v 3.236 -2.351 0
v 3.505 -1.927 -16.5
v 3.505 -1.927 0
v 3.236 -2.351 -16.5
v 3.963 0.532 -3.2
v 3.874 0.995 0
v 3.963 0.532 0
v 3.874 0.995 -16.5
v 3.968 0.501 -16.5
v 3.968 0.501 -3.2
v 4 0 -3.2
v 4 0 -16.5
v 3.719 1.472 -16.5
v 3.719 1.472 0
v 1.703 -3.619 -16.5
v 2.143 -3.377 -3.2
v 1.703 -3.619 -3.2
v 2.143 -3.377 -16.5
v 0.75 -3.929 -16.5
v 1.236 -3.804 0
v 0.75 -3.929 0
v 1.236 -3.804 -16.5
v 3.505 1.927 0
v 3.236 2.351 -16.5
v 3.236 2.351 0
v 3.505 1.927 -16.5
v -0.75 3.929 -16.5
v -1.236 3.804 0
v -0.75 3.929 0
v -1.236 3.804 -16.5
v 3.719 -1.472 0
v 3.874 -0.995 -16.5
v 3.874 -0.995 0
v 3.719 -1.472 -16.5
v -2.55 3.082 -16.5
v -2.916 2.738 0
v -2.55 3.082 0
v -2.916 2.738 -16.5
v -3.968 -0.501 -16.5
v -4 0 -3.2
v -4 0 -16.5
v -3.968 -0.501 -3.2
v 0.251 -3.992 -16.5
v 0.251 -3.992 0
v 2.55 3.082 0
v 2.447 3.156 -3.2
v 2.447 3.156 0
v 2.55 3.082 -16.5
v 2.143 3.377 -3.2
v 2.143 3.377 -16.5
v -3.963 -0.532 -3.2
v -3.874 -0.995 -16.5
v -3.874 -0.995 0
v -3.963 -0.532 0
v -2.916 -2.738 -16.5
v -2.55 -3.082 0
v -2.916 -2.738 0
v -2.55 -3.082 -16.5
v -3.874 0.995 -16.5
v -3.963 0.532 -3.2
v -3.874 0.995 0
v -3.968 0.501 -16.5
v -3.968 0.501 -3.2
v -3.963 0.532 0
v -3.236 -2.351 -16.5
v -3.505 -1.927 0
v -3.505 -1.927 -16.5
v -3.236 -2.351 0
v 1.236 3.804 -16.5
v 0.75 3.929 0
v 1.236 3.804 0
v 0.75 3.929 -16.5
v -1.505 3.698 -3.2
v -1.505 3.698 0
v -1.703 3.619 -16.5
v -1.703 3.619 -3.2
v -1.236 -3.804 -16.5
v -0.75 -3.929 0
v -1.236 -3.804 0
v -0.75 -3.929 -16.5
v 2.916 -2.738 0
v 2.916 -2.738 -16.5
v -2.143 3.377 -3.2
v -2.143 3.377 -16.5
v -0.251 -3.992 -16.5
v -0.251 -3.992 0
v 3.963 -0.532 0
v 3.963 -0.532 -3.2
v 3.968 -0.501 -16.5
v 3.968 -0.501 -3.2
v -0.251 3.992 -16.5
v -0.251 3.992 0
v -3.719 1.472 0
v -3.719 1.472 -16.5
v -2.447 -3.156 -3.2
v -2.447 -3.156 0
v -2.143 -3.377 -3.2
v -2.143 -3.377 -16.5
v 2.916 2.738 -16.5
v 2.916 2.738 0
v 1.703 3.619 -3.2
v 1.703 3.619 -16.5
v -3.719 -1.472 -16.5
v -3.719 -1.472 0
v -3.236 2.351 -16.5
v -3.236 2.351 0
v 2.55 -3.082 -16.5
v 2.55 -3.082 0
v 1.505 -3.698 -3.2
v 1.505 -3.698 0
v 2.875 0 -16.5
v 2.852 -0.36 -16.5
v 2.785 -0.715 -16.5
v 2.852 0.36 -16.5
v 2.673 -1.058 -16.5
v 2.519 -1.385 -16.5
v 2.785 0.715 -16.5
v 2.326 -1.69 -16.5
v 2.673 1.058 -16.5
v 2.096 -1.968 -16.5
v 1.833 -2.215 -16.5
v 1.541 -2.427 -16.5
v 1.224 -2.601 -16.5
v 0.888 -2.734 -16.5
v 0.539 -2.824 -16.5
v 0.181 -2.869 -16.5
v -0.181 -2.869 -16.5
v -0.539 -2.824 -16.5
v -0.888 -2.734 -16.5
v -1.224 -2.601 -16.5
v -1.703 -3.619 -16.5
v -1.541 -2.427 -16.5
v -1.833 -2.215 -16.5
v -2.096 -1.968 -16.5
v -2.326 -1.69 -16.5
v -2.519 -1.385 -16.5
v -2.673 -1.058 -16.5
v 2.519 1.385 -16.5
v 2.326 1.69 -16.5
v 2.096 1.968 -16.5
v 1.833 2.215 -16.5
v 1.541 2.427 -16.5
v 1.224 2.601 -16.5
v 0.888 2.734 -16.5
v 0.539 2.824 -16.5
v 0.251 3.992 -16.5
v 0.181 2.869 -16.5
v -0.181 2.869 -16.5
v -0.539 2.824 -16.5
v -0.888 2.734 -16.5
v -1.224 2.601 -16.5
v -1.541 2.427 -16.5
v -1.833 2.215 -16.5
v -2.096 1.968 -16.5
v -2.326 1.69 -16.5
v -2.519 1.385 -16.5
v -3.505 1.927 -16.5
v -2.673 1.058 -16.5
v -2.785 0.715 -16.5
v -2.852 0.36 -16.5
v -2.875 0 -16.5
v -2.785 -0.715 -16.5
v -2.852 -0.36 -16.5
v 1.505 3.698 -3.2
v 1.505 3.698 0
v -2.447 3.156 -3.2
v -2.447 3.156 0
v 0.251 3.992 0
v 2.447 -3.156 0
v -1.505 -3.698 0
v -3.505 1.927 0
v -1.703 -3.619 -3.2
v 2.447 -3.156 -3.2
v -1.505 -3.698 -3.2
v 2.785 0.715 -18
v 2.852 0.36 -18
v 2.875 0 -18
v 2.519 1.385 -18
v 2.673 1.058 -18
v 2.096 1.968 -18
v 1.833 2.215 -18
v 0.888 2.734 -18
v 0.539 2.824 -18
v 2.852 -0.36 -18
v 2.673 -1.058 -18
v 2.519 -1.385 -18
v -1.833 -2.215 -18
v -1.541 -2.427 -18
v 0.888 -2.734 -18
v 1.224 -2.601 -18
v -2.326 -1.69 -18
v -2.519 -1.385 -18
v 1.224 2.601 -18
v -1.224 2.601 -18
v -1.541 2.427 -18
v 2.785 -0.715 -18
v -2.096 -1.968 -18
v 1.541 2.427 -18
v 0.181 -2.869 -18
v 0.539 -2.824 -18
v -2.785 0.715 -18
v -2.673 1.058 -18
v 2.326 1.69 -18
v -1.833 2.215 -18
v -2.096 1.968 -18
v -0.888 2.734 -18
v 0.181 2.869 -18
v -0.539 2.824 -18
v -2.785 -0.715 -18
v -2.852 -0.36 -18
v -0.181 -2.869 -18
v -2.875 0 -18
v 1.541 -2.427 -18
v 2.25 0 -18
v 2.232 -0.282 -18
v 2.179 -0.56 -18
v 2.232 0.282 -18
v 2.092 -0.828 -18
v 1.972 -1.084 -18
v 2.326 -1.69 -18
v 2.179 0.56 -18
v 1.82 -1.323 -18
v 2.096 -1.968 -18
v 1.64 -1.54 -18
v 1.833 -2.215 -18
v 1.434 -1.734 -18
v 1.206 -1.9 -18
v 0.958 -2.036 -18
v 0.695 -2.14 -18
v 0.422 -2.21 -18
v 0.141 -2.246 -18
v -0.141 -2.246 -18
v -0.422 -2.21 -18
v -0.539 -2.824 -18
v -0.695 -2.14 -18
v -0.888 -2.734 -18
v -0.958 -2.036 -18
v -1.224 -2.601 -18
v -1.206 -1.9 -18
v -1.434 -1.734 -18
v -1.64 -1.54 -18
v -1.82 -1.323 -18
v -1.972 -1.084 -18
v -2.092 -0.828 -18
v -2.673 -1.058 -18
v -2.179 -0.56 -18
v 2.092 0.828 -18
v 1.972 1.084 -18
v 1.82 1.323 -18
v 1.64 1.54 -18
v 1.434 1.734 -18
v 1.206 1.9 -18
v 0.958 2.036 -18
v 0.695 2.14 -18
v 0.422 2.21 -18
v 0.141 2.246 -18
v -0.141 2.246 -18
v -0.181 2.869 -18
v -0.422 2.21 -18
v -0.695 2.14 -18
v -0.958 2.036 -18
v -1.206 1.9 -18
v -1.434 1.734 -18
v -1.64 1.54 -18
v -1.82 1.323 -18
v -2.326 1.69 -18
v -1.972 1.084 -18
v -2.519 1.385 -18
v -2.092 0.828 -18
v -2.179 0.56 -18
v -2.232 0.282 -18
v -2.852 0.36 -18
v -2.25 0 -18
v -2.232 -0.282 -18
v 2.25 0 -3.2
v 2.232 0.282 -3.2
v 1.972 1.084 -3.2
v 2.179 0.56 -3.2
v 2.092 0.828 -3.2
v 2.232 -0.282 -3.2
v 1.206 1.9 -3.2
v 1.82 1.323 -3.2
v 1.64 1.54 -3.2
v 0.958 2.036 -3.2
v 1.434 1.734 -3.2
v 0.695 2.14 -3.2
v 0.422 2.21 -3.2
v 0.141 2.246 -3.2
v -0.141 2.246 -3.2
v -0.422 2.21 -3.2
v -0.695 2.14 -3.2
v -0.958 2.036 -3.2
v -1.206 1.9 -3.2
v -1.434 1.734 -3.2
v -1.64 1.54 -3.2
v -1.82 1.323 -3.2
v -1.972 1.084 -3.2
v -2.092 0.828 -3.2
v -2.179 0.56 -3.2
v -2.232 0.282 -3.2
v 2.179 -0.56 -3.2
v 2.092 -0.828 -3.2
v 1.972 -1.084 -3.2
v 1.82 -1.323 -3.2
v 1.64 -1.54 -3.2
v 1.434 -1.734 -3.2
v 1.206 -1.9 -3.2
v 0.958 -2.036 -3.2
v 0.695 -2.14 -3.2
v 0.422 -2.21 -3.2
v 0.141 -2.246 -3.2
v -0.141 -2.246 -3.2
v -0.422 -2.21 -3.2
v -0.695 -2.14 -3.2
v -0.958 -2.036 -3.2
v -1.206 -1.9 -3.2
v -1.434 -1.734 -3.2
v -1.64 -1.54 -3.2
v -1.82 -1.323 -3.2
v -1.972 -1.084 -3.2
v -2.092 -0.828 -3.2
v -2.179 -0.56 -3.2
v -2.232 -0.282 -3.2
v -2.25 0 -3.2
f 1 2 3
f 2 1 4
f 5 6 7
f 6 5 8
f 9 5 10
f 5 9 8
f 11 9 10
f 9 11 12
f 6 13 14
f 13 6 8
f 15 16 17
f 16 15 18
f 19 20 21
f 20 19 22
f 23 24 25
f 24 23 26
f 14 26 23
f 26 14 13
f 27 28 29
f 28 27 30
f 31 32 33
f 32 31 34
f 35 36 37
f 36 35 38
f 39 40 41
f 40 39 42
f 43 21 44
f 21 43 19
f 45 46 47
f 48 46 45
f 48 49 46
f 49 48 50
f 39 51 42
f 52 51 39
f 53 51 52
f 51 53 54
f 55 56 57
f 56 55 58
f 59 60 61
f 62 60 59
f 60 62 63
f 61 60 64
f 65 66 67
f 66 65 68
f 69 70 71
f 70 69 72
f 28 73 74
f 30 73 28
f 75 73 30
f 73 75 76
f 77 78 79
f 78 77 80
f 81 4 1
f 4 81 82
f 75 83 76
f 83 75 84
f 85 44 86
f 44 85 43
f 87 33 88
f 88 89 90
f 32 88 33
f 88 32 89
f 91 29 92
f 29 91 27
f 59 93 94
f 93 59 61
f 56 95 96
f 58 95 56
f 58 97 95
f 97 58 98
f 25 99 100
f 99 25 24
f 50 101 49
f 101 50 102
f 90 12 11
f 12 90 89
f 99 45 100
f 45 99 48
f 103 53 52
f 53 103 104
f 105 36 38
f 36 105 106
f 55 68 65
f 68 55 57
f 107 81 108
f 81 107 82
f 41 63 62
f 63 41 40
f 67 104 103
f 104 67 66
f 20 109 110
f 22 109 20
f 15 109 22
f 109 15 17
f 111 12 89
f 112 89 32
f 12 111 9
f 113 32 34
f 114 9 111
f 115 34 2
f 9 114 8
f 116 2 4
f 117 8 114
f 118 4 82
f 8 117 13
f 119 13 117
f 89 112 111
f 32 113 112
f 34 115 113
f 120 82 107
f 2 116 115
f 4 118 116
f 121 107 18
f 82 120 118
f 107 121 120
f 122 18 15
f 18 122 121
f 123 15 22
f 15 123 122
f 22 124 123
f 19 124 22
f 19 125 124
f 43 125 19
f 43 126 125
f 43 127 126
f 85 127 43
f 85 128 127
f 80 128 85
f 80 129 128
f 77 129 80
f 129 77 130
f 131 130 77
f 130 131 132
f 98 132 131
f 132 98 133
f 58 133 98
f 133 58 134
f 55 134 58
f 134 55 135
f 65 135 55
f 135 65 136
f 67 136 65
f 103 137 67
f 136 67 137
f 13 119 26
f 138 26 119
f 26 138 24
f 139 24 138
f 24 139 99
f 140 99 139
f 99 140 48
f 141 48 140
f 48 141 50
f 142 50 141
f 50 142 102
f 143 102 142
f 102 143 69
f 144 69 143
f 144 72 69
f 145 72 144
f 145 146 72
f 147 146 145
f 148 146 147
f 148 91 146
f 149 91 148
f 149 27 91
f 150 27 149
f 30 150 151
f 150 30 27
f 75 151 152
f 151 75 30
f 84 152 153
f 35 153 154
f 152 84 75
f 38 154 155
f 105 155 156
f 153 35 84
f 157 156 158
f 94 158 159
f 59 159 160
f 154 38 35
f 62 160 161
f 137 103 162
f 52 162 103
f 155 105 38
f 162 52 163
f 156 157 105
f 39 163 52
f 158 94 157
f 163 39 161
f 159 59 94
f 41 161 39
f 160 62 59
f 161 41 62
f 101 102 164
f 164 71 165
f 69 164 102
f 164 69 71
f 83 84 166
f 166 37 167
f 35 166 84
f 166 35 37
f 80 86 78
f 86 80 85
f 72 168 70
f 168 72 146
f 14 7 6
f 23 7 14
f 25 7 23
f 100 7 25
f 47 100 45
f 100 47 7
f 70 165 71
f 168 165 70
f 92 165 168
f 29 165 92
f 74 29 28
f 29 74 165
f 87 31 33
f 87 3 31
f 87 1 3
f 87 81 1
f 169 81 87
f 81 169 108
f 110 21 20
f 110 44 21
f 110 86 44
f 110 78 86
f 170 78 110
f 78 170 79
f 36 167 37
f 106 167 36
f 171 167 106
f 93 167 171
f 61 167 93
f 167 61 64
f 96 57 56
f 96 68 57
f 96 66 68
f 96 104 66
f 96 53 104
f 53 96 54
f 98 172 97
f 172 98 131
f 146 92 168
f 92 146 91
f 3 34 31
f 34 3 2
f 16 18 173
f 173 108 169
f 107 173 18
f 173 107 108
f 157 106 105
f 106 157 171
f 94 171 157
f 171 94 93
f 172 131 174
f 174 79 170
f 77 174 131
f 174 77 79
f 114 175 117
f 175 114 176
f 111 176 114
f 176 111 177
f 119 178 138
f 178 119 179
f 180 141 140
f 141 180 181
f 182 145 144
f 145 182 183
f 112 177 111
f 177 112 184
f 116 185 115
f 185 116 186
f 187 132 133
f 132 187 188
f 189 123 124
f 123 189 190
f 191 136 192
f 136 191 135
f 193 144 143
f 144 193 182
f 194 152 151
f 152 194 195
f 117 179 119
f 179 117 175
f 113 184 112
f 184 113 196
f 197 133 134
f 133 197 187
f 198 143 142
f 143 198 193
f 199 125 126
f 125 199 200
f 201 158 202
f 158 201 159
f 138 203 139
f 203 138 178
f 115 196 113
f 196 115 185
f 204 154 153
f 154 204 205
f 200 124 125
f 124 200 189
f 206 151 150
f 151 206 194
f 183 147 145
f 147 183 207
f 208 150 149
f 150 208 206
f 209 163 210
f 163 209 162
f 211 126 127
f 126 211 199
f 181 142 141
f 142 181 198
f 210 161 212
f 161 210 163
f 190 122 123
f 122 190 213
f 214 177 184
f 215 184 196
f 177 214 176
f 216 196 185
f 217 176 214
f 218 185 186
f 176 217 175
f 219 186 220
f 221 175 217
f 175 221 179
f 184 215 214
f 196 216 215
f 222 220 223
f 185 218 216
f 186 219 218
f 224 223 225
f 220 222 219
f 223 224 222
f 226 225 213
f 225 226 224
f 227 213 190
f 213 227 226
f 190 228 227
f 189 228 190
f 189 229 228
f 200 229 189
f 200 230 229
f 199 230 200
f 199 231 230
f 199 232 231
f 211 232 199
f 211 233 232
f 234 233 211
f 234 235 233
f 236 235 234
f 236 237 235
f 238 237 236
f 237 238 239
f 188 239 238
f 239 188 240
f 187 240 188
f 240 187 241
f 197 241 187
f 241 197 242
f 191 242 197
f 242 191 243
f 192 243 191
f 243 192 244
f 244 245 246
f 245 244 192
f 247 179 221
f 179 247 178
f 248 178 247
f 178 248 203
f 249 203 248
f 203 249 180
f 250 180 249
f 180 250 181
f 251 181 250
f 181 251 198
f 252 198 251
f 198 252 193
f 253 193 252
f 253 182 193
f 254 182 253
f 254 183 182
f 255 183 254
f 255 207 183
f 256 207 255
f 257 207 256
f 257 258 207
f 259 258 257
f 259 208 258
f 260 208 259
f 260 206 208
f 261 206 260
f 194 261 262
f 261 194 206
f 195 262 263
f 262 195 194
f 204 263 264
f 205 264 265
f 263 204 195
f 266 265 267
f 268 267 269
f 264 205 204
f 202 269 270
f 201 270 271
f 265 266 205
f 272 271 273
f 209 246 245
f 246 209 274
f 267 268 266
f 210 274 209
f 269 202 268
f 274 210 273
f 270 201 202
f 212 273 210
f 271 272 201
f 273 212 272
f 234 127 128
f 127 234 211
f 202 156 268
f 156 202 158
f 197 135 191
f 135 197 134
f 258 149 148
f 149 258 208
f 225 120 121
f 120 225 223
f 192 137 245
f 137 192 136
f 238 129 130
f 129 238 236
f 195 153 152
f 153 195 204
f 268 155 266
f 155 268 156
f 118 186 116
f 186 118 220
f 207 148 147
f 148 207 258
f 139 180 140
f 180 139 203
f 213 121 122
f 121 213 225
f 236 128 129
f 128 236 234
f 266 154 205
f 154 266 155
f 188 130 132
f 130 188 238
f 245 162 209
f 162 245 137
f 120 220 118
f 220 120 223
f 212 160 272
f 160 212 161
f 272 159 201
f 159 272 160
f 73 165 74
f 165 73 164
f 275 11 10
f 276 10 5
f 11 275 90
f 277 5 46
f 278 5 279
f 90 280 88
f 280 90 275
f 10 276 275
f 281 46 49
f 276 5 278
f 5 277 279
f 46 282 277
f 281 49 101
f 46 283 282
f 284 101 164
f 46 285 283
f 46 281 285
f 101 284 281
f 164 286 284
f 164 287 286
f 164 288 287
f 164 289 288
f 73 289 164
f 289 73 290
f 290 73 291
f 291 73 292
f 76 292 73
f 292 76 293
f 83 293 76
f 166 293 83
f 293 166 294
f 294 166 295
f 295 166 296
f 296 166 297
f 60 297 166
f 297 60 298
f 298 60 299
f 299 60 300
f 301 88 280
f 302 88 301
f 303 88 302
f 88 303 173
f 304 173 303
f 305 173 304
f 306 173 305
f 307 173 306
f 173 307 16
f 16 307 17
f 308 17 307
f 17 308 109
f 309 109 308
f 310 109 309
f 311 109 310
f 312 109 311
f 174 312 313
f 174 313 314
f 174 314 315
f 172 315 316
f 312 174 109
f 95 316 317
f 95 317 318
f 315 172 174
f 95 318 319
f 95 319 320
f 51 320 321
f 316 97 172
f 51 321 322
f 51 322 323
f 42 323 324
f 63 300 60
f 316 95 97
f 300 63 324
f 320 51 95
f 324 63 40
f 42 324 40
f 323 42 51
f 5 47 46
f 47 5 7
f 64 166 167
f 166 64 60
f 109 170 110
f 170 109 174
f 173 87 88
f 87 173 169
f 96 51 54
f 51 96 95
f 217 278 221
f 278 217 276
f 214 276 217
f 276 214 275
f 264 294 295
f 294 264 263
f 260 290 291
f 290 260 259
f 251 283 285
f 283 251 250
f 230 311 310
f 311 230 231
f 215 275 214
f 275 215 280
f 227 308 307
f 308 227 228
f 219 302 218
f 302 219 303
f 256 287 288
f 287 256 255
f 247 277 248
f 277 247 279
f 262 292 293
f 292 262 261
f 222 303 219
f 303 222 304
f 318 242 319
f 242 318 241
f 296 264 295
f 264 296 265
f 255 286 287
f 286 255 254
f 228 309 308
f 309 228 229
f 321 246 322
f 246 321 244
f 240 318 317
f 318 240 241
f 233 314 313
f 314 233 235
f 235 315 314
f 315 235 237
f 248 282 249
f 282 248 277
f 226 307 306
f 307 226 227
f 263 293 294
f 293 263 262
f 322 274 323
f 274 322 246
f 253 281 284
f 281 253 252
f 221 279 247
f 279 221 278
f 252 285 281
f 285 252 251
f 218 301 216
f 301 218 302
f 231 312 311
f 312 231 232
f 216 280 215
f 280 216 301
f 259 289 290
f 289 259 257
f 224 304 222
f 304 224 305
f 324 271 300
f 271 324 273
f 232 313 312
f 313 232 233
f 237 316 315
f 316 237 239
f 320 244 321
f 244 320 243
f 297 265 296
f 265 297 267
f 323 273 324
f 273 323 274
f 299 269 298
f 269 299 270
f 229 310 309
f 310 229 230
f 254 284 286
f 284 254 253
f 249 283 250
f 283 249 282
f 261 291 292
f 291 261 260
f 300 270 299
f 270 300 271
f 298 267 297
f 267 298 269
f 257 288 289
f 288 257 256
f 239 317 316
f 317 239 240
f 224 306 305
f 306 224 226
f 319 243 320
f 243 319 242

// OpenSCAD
$fn = 50;

difference() {
	union() {
		translate(v = [0, 0, -16.5]) {
			cylinder(h = 16.5, r = 4.0);
		}
		#translate(v = [0, 0, -18.0]) {
			cylinder(h = 18, r = 2.875);
		}
	}
	union() {
		translate(v = [0, 0, 0]) {
			rotate(a = [0, 0, 0]) {
				difference() {
					union() {
						translate(v = [0, 0, -3.2]) {
							linear_extrude(height = 3.2) {
								polygon(points = [[4.2698, 0.0], [2.1349000000000005, 3.697755269078796], [-2.134899999999999, 3.6977552690787965], [-4.2698, 5.228996902999369e-16], [-2.134900000000002, -3.6977552690787956], [2.1348999999999974, -3.697755269078798]]);
							}
						}
					}
					union();
				}
			}
		}
		#translate(v = [0, 0, -100.0]) {
			cylinder(h = 200, r = 2.25);
		}
	}
}
